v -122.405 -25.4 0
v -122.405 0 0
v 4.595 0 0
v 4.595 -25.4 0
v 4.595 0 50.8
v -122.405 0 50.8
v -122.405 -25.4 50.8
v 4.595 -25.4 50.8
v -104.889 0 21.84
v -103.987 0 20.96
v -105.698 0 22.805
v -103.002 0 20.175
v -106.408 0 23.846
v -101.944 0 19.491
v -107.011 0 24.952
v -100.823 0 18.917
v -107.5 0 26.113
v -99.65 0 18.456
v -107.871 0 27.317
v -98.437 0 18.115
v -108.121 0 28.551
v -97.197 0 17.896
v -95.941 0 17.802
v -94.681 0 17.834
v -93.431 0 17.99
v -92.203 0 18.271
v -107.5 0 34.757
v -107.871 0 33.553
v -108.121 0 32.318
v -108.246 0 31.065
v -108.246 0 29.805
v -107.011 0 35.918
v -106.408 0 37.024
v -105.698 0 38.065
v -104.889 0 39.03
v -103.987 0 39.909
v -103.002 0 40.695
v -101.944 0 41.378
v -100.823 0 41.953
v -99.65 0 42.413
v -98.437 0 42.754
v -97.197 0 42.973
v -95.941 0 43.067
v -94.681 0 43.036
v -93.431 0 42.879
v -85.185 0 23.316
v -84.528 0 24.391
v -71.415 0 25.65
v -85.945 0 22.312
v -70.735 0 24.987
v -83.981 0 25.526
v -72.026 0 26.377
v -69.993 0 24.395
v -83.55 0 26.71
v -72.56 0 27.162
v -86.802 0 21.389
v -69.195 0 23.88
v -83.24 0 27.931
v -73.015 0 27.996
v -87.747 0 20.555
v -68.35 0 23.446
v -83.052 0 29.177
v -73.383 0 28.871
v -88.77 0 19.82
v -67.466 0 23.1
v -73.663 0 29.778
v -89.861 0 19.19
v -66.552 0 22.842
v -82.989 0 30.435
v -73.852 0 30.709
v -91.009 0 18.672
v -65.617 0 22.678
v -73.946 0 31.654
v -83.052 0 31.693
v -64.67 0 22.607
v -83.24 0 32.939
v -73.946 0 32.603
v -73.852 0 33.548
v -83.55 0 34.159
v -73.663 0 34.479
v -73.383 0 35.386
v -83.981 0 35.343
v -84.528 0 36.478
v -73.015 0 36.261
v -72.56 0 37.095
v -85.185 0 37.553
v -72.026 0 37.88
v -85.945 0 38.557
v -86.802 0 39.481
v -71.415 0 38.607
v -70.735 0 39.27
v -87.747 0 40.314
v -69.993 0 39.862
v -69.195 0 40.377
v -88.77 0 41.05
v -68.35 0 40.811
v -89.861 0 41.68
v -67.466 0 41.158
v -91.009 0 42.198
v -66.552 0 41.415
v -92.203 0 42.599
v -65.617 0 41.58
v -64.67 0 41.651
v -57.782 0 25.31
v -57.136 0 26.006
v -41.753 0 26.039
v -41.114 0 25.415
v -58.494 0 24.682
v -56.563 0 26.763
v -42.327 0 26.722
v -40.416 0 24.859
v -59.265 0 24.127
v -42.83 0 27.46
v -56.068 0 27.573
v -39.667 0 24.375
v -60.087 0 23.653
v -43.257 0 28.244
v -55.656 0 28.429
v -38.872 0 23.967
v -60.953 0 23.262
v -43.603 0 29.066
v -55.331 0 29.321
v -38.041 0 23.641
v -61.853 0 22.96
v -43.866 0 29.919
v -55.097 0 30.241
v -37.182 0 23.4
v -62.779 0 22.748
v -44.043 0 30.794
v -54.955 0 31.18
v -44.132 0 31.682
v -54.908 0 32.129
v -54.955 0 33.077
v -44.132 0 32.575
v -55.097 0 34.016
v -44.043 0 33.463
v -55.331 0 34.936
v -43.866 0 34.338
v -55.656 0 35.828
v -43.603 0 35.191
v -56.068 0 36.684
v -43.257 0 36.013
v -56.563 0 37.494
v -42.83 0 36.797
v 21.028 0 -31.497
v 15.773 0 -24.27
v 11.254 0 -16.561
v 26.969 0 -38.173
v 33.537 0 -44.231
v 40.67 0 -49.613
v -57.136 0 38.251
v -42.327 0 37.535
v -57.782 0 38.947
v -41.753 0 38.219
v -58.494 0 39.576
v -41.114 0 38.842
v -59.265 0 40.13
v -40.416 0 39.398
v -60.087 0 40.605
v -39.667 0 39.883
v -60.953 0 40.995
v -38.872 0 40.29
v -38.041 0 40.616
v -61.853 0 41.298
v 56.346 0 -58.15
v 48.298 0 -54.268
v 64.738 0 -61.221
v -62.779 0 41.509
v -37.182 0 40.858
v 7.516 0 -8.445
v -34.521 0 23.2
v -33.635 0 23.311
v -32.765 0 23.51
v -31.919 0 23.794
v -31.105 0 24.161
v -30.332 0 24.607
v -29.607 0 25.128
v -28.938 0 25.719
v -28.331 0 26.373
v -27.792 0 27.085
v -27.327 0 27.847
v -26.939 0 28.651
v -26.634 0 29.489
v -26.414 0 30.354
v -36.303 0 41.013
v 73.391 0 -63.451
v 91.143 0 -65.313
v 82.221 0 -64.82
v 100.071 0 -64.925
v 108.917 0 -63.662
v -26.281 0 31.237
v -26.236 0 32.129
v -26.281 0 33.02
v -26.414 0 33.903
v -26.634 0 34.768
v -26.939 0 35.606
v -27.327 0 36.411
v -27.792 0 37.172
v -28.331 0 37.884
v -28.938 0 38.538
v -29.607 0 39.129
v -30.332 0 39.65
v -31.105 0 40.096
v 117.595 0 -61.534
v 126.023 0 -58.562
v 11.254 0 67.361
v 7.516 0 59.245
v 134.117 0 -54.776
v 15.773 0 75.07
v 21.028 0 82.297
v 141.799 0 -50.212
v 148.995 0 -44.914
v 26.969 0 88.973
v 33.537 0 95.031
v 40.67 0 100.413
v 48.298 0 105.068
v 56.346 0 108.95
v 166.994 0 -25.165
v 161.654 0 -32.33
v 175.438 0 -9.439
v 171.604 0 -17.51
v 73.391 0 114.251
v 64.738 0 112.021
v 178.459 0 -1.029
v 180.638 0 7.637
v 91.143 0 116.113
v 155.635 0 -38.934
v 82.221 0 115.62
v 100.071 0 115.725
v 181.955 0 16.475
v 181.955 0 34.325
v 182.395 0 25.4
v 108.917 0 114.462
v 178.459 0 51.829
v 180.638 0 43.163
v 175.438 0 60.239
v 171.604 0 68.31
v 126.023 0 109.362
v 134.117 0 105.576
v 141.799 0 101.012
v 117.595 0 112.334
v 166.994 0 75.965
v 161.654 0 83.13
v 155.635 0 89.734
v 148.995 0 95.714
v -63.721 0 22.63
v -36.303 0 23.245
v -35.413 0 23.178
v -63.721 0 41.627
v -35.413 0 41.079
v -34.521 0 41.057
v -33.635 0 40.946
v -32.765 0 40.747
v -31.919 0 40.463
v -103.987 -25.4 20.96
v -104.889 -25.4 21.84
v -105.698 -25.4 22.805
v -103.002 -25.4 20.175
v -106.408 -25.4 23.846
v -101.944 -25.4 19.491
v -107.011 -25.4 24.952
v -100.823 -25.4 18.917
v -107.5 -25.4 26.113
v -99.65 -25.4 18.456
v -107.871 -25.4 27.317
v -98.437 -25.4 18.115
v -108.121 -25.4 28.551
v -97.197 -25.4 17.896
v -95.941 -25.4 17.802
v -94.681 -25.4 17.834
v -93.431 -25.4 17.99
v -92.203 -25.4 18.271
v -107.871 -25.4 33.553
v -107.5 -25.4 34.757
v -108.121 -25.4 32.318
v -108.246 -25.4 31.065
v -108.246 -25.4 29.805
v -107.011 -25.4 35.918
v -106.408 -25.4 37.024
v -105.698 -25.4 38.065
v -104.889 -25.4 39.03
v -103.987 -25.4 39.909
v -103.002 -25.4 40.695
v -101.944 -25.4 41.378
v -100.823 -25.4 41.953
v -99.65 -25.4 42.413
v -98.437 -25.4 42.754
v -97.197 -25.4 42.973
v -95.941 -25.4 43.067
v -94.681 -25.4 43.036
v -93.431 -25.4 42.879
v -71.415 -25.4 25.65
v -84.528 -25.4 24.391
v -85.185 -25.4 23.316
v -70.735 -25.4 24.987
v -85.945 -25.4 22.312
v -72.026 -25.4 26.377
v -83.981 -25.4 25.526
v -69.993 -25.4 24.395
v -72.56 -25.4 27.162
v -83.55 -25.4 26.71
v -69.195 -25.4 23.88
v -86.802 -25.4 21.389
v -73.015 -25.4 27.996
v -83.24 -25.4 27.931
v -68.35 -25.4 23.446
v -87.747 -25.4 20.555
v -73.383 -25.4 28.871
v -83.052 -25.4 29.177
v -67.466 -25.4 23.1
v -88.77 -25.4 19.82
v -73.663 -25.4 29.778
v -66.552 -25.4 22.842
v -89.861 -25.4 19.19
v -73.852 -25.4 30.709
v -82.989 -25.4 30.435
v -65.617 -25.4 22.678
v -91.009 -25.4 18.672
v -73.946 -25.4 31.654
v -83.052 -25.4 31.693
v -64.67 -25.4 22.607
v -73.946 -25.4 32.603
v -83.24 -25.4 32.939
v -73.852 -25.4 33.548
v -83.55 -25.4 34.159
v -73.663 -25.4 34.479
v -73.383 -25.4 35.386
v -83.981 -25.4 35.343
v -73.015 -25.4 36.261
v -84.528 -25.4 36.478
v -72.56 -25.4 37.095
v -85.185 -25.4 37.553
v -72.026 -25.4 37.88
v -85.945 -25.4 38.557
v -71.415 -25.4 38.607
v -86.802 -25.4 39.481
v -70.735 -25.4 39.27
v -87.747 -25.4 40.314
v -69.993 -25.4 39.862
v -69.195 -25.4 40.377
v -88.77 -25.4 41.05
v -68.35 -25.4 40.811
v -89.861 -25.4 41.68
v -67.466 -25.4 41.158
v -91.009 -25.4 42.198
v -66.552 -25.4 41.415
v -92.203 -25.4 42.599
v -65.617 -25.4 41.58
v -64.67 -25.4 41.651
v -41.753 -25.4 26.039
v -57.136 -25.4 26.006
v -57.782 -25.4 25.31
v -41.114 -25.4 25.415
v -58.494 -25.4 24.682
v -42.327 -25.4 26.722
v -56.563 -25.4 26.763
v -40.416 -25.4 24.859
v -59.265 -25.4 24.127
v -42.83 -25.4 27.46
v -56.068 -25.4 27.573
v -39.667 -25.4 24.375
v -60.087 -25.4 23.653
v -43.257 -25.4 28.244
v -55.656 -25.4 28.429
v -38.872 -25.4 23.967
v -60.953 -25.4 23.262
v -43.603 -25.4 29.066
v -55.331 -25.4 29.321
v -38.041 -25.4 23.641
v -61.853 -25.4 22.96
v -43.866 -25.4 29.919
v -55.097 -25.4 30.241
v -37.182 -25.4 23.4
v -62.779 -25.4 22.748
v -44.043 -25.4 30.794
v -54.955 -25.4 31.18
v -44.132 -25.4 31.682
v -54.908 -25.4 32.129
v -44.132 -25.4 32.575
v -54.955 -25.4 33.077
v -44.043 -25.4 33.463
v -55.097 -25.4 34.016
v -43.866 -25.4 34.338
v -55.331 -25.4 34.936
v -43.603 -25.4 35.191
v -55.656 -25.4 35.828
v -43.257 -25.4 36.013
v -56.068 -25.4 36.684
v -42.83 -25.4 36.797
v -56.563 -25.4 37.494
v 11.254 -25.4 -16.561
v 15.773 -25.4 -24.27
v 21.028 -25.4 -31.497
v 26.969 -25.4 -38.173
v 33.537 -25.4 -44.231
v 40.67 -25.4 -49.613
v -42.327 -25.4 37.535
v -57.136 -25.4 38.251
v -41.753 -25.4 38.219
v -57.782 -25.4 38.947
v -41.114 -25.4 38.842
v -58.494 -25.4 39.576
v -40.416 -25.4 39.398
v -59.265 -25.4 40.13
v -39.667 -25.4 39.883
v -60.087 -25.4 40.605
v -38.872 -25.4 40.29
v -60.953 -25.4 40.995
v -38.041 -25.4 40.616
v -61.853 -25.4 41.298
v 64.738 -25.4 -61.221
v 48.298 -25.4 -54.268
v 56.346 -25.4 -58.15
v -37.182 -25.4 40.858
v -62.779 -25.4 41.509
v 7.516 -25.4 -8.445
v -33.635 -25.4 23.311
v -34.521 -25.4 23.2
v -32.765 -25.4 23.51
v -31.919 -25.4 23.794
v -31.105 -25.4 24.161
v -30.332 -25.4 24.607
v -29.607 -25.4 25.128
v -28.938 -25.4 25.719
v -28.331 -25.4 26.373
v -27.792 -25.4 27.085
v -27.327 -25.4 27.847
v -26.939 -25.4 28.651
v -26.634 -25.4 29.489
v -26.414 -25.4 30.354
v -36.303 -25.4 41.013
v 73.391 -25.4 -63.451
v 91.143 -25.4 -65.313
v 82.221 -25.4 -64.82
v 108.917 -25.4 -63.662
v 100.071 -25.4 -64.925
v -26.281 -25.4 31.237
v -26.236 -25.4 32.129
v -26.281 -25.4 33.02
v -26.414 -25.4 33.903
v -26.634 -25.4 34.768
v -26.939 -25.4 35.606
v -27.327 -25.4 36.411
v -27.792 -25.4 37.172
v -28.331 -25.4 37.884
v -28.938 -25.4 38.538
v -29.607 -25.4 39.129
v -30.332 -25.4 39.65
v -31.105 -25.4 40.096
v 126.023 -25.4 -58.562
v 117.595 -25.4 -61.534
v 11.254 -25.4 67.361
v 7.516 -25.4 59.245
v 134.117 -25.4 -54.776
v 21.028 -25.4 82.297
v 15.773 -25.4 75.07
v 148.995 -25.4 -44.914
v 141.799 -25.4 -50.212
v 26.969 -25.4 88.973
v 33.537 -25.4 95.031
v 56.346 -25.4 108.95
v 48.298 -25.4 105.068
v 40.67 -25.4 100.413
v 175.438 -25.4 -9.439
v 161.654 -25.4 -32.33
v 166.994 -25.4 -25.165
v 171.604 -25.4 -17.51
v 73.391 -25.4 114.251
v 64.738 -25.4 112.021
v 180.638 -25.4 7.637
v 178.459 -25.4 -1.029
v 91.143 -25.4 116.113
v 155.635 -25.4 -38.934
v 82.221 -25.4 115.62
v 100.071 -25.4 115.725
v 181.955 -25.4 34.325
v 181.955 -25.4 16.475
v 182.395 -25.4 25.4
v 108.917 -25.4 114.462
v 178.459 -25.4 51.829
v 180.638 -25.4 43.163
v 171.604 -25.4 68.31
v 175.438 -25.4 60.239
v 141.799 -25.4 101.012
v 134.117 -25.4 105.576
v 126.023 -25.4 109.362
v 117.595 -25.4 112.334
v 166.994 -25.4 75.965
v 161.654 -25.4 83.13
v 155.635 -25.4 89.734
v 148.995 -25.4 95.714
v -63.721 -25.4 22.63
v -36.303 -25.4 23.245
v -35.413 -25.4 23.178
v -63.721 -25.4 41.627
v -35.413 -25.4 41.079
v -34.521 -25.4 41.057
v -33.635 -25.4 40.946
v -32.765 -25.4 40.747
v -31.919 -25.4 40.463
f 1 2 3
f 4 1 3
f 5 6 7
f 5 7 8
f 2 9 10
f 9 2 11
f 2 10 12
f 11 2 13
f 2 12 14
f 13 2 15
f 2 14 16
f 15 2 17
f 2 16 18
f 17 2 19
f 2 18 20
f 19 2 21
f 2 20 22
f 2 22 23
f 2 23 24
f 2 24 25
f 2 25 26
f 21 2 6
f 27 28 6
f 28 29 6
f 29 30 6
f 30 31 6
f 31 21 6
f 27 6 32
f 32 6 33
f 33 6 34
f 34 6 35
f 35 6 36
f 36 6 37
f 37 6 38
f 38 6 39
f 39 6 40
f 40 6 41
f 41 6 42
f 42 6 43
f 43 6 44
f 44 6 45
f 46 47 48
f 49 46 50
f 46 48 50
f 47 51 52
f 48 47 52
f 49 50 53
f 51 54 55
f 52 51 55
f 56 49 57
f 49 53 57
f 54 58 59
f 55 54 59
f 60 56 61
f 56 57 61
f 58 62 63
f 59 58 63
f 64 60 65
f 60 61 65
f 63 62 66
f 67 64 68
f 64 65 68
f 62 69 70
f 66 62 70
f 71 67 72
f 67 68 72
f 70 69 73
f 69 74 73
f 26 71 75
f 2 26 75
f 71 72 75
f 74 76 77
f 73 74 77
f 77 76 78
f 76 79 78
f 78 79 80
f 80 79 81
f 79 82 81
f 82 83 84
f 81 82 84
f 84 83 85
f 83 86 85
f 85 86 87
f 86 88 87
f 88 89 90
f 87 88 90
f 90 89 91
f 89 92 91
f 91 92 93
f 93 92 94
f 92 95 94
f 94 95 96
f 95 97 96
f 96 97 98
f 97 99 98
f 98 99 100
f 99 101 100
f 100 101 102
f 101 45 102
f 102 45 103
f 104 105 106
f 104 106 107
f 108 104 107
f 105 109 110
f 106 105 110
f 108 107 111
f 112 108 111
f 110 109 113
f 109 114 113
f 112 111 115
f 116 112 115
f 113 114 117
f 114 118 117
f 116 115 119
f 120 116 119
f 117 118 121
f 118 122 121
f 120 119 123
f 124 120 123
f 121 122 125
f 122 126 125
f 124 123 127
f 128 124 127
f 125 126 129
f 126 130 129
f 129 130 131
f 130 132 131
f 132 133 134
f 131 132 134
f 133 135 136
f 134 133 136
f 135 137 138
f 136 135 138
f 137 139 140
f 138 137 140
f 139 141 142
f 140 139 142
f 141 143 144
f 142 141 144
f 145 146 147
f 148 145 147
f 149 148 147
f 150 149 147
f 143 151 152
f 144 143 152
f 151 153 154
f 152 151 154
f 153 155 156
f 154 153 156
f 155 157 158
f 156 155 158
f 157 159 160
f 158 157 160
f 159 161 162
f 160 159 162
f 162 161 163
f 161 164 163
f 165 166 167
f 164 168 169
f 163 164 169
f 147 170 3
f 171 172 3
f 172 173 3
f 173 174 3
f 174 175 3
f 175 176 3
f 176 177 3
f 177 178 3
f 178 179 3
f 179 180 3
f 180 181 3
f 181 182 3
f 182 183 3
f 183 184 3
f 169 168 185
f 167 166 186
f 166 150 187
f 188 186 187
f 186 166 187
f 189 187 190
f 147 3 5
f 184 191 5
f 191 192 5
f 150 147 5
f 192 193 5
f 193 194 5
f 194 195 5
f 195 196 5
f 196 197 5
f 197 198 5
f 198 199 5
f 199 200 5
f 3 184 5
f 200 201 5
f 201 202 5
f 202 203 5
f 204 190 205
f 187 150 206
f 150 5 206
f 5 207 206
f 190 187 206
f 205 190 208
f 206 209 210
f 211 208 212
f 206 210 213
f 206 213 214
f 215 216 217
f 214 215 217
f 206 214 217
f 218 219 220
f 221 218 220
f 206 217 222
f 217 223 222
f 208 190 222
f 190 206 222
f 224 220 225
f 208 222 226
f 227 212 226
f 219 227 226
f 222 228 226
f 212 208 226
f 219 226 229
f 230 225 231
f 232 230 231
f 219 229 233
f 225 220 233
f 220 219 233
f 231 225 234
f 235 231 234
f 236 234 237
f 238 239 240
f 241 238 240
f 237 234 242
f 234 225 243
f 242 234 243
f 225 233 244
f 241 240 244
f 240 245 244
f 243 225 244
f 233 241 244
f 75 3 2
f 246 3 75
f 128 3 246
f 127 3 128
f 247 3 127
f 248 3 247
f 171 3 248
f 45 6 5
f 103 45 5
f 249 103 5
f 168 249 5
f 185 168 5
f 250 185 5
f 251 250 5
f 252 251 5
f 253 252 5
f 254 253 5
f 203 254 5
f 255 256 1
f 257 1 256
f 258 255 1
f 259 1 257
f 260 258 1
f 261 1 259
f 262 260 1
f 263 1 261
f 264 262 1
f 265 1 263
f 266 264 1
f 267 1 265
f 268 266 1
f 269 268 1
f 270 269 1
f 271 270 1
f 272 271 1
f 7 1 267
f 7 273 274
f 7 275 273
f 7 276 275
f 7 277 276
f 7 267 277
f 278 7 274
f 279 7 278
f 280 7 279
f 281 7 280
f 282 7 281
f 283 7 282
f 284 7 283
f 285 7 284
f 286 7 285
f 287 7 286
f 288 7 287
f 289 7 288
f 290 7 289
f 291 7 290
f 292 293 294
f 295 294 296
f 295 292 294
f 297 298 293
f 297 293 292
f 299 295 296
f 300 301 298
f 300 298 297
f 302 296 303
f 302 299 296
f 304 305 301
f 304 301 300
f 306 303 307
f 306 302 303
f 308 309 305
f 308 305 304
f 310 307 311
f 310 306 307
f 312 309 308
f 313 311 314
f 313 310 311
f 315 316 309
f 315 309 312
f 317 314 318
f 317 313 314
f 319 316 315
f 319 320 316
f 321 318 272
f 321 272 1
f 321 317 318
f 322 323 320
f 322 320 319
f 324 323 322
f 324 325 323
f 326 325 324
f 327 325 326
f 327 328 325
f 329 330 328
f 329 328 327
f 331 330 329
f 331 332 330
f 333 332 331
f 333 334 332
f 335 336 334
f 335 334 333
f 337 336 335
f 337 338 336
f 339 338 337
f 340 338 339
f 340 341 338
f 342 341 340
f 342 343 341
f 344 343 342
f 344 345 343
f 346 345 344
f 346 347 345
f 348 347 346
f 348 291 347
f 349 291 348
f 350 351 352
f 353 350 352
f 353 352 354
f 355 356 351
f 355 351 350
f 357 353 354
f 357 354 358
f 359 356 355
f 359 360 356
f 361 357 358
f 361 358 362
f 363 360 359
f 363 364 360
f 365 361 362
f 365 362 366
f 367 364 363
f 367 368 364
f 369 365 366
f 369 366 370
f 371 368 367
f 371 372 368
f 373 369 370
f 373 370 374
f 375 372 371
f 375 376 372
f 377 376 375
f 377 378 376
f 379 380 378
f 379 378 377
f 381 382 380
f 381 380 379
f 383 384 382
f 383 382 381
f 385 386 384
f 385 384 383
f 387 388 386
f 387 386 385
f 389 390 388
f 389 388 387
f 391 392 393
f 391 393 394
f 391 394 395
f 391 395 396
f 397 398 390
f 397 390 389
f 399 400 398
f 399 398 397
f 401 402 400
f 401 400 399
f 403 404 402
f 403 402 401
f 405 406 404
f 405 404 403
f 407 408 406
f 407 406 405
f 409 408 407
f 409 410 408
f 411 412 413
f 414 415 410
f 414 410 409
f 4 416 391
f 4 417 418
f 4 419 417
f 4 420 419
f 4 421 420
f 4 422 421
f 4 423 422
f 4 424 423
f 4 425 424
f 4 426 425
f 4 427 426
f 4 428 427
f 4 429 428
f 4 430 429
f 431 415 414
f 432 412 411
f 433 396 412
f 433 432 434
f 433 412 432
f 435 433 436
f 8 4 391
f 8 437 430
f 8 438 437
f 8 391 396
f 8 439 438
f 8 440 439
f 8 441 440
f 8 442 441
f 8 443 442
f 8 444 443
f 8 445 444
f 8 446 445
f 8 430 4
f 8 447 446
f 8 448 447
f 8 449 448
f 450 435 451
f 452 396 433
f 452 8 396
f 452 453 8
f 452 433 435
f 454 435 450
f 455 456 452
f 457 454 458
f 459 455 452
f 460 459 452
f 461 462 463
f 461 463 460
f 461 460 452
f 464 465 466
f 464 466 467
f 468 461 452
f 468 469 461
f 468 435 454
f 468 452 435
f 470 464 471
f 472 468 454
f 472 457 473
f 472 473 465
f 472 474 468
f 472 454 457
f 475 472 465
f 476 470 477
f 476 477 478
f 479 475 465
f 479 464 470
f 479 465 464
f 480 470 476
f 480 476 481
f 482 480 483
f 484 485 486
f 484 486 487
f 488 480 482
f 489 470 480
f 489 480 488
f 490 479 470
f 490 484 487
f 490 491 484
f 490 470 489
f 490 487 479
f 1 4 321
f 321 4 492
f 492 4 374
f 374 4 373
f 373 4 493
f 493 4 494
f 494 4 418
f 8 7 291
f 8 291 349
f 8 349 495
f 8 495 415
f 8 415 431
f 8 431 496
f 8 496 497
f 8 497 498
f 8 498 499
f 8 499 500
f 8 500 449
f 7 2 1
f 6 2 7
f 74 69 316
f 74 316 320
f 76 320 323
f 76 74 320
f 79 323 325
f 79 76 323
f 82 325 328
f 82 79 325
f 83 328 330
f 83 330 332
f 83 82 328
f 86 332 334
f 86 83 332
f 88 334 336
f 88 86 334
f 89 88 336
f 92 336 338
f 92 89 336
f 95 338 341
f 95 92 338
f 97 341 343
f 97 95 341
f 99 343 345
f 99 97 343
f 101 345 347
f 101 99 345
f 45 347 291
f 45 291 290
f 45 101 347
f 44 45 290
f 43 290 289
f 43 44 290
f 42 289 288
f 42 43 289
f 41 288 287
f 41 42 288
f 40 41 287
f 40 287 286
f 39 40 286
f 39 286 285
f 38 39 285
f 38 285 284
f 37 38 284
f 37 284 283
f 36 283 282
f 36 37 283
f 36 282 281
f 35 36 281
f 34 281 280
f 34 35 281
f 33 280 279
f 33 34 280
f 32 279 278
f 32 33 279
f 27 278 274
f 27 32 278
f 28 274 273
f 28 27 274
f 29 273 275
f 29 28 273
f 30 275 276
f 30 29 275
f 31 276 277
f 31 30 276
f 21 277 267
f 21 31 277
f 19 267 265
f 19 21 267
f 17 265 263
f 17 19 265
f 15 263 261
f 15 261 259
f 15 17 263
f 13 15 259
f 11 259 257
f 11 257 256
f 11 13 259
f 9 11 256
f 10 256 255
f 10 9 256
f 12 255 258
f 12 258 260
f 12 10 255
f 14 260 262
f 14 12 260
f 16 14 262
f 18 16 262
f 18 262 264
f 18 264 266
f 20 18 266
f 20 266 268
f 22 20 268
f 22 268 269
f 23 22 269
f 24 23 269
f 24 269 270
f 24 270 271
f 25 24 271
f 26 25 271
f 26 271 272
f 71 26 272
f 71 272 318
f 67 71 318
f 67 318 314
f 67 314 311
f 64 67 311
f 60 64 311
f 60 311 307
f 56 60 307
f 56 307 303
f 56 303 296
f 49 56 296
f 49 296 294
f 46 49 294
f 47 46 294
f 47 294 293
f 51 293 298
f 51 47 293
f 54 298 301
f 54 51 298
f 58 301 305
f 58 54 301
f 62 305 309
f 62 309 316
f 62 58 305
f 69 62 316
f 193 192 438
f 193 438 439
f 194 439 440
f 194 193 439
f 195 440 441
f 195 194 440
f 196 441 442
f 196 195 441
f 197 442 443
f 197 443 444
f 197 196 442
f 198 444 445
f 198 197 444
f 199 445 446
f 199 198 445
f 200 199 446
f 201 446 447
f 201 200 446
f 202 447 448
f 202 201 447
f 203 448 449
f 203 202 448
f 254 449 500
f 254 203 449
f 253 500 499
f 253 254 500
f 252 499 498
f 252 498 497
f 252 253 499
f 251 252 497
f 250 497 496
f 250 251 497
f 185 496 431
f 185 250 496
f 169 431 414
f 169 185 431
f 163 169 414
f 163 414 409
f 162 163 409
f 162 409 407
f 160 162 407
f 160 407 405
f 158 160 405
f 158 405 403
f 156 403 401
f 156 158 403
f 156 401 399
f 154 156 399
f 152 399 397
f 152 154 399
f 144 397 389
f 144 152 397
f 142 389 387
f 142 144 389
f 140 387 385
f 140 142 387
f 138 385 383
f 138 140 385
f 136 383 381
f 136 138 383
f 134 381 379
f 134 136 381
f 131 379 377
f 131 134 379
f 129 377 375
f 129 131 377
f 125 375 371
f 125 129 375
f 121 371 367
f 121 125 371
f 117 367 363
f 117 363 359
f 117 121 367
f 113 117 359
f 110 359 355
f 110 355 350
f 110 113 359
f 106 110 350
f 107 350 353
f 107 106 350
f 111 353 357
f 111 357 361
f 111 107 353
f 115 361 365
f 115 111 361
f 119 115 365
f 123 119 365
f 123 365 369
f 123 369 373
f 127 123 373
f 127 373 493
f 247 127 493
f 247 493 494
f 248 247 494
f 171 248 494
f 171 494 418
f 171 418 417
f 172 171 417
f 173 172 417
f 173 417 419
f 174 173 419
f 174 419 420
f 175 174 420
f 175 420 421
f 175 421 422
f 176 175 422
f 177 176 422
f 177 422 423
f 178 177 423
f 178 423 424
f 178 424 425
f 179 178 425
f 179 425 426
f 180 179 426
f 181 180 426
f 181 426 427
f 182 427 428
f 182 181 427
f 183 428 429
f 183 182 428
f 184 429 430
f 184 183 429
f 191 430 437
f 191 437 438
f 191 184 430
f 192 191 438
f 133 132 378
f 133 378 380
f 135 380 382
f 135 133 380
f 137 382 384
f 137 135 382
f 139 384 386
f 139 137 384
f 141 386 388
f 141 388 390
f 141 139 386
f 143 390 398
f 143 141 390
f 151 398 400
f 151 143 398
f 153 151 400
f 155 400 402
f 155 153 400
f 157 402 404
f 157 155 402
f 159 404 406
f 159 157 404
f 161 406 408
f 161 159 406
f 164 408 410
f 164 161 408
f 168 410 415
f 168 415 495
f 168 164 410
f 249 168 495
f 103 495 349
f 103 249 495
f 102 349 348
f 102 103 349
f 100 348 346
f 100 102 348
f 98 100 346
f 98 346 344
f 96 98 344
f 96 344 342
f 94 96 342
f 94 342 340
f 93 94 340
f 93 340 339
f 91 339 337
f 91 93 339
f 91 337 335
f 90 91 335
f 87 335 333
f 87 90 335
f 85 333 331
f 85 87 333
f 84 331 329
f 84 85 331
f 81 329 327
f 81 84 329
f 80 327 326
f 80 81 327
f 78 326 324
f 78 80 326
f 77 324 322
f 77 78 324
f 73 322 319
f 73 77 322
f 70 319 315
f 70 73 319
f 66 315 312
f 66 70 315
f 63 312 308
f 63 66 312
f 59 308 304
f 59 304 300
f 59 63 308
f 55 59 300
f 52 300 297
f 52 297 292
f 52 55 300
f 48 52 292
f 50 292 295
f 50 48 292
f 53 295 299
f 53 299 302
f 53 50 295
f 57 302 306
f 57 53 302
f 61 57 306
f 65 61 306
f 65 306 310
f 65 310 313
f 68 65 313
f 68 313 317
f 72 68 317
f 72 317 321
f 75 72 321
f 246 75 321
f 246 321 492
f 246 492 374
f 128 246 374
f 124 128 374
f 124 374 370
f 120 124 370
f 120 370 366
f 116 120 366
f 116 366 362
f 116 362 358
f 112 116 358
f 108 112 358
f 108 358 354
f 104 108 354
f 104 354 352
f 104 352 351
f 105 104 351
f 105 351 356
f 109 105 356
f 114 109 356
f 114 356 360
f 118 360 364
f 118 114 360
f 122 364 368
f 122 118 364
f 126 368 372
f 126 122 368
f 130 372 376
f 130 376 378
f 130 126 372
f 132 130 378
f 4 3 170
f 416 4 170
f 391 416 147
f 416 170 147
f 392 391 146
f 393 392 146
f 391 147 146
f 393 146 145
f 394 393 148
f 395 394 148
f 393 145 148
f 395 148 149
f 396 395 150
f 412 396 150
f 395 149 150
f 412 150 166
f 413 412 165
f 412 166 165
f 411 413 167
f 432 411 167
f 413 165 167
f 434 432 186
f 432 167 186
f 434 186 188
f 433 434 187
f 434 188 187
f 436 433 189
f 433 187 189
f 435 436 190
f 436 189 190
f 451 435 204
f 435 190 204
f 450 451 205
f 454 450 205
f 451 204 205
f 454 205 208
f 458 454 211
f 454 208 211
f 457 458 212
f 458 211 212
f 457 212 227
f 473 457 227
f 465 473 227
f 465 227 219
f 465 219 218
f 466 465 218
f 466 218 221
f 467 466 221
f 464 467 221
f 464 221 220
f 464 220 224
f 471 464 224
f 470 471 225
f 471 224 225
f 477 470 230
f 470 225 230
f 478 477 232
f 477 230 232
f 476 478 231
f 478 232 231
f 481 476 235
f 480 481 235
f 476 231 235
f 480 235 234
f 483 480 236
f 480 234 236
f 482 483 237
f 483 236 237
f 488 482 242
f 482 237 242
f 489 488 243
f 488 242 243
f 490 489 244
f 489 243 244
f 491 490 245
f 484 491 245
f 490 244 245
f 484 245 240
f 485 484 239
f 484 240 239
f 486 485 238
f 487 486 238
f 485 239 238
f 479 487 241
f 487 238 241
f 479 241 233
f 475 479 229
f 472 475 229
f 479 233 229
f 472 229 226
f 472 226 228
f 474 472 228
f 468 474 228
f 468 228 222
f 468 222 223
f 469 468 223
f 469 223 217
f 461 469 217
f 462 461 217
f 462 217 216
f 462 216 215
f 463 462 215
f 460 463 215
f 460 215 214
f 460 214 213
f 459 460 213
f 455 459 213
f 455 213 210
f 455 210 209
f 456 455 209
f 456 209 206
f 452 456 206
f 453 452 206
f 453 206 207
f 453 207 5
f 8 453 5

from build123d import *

# Parameters (mm, degrees)
F0_W     = 127
F0_H     = 50.8
F0_R     = 12.6365
F0_R_2   = 9.525
F0_R_3   = 8.9535
F1_DEPTH = 25.4


with BuildPart() as f1:
    # F0 (on Front) → F1 (new body)
    with BuildSketch(Plane.XZ):
        with Locations((-58.905346, 25.4)):
            Rectangle(F0_W, F0_H)
        with Locations((-95.625527, 30.434817)):
            Circle(F0_R, mode=Mode.SUBTRACT)
        with Locations((-64.432904, 32.12858)):
            Circle(F0_R_2, mode=Mode.SUBTRACT)
        with Locations((-35.189819, 32.12858)):
            Circle(F0_R_3, mode=Mode.SUBTRACT)
        with BuildLine():
            ThreePointArc((4.594654, 0), (182.394654, 25.4), (4.594654, 50.8))
            Line((4.594654, 50.8), (4.594654, 0))
        make_face()
    extrude(amount=F1_DEPTH)


solid = f1.part
